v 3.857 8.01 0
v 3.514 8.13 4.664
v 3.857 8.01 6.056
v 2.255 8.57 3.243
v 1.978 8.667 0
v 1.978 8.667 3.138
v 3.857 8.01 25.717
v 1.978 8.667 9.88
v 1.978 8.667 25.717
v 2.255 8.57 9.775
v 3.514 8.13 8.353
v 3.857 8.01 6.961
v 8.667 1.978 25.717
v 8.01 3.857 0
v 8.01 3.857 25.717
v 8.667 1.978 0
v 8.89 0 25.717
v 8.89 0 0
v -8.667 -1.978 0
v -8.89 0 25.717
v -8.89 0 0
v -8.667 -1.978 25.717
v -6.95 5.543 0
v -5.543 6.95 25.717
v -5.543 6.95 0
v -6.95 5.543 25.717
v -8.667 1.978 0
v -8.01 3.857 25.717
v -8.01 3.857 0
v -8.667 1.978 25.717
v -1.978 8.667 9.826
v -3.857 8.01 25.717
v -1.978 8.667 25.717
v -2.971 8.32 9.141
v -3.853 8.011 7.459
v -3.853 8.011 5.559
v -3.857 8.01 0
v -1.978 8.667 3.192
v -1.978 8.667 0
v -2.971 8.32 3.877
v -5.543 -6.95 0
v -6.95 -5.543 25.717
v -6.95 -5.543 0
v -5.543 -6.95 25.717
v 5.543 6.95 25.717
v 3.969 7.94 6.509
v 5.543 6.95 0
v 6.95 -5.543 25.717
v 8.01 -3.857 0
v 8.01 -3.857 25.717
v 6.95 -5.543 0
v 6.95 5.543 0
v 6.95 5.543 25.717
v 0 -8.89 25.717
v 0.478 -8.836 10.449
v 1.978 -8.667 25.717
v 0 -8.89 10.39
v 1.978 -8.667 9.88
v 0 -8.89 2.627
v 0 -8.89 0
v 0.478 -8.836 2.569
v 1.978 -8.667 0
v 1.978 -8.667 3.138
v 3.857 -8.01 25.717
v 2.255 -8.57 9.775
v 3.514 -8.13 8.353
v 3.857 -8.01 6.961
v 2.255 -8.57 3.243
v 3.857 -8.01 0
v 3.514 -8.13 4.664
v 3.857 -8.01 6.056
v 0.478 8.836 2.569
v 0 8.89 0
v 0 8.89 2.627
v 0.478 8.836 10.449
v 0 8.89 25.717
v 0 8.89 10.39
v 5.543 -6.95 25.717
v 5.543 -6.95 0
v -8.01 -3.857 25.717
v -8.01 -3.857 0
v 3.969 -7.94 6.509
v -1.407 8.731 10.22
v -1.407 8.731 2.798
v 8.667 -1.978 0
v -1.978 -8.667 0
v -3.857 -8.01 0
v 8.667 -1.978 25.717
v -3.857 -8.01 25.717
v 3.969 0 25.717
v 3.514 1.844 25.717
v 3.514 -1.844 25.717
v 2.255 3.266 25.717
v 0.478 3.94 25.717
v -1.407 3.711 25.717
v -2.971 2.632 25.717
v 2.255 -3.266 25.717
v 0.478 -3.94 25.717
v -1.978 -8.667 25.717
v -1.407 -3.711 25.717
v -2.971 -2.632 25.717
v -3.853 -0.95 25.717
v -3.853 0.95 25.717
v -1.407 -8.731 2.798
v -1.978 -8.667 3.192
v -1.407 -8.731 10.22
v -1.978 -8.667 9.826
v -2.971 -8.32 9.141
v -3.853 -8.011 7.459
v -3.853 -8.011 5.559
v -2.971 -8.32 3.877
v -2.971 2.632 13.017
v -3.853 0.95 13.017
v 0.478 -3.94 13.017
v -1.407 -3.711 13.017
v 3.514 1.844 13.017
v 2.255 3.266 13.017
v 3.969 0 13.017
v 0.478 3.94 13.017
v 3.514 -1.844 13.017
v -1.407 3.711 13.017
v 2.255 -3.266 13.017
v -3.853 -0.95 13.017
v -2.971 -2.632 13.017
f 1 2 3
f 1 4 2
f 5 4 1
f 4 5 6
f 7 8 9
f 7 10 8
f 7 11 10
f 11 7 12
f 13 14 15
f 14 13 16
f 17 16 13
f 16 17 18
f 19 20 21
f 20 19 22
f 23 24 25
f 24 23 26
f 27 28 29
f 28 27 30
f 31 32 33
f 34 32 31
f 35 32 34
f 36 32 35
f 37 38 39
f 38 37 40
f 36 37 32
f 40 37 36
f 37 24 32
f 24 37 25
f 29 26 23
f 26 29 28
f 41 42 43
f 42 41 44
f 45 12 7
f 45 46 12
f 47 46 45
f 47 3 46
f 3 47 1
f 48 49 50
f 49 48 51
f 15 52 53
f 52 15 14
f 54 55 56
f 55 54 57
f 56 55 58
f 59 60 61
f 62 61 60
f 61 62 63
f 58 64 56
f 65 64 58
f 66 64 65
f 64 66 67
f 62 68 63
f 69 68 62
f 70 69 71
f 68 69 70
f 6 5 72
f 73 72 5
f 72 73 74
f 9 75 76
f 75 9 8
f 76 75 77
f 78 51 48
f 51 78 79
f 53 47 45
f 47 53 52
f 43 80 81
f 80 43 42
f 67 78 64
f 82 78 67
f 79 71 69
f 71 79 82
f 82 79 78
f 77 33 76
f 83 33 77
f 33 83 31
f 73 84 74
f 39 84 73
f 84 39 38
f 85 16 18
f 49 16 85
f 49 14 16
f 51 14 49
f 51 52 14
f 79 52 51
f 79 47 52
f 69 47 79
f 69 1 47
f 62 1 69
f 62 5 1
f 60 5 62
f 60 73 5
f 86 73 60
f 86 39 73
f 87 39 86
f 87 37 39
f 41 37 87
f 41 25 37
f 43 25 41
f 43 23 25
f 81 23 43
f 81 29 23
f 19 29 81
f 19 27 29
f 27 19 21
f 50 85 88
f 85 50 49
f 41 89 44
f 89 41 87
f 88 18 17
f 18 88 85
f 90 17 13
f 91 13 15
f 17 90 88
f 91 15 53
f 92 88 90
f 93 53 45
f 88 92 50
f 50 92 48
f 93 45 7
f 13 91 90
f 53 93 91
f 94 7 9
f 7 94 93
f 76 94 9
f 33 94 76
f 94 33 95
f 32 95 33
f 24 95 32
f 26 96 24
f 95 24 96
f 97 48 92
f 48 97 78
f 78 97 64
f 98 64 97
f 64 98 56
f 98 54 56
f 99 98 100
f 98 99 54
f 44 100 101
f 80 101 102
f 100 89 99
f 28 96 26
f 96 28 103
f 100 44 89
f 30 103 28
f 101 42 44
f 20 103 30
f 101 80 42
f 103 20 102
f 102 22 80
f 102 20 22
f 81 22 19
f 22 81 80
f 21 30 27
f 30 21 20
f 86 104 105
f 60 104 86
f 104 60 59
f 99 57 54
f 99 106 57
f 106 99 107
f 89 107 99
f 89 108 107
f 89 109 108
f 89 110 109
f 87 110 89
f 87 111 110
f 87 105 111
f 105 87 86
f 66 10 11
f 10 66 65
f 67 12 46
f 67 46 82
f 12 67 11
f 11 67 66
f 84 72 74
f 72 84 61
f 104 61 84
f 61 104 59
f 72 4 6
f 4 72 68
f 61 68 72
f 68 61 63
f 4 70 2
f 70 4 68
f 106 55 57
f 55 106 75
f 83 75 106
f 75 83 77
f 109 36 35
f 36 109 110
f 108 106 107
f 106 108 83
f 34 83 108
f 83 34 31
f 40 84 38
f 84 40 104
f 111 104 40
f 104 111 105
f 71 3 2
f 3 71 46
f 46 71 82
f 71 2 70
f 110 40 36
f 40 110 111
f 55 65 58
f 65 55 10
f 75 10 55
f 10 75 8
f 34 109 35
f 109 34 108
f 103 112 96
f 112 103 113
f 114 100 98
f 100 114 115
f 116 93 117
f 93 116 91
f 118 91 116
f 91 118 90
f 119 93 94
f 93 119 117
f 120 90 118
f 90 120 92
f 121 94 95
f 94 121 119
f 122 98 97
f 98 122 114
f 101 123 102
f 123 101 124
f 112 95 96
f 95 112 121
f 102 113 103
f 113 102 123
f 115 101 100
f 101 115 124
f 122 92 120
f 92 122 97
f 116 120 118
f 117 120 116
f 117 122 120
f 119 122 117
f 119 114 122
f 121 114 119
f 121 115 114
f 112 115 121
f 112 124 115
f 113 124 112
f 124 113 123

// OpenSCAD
inch = 25.4;

rod_dia = 5/16*inch;
outer_dia = 0.7*inch;
margin = 0.1*inch;

difference()
{
	cylinder(h=rod_dia+2*margin+0.5*inch,r=outer_dia/2);

	translate(v=[0,  inch/2,   rod_dia/2+margin])
	rotate(a=[90,0,0])
		cylinder(h=inch,r=rod_dia/2);

	translate(v=[0,0,rod_dia+2*margin])
		cylinder(h=inch, r=rod_dia/2);
}
